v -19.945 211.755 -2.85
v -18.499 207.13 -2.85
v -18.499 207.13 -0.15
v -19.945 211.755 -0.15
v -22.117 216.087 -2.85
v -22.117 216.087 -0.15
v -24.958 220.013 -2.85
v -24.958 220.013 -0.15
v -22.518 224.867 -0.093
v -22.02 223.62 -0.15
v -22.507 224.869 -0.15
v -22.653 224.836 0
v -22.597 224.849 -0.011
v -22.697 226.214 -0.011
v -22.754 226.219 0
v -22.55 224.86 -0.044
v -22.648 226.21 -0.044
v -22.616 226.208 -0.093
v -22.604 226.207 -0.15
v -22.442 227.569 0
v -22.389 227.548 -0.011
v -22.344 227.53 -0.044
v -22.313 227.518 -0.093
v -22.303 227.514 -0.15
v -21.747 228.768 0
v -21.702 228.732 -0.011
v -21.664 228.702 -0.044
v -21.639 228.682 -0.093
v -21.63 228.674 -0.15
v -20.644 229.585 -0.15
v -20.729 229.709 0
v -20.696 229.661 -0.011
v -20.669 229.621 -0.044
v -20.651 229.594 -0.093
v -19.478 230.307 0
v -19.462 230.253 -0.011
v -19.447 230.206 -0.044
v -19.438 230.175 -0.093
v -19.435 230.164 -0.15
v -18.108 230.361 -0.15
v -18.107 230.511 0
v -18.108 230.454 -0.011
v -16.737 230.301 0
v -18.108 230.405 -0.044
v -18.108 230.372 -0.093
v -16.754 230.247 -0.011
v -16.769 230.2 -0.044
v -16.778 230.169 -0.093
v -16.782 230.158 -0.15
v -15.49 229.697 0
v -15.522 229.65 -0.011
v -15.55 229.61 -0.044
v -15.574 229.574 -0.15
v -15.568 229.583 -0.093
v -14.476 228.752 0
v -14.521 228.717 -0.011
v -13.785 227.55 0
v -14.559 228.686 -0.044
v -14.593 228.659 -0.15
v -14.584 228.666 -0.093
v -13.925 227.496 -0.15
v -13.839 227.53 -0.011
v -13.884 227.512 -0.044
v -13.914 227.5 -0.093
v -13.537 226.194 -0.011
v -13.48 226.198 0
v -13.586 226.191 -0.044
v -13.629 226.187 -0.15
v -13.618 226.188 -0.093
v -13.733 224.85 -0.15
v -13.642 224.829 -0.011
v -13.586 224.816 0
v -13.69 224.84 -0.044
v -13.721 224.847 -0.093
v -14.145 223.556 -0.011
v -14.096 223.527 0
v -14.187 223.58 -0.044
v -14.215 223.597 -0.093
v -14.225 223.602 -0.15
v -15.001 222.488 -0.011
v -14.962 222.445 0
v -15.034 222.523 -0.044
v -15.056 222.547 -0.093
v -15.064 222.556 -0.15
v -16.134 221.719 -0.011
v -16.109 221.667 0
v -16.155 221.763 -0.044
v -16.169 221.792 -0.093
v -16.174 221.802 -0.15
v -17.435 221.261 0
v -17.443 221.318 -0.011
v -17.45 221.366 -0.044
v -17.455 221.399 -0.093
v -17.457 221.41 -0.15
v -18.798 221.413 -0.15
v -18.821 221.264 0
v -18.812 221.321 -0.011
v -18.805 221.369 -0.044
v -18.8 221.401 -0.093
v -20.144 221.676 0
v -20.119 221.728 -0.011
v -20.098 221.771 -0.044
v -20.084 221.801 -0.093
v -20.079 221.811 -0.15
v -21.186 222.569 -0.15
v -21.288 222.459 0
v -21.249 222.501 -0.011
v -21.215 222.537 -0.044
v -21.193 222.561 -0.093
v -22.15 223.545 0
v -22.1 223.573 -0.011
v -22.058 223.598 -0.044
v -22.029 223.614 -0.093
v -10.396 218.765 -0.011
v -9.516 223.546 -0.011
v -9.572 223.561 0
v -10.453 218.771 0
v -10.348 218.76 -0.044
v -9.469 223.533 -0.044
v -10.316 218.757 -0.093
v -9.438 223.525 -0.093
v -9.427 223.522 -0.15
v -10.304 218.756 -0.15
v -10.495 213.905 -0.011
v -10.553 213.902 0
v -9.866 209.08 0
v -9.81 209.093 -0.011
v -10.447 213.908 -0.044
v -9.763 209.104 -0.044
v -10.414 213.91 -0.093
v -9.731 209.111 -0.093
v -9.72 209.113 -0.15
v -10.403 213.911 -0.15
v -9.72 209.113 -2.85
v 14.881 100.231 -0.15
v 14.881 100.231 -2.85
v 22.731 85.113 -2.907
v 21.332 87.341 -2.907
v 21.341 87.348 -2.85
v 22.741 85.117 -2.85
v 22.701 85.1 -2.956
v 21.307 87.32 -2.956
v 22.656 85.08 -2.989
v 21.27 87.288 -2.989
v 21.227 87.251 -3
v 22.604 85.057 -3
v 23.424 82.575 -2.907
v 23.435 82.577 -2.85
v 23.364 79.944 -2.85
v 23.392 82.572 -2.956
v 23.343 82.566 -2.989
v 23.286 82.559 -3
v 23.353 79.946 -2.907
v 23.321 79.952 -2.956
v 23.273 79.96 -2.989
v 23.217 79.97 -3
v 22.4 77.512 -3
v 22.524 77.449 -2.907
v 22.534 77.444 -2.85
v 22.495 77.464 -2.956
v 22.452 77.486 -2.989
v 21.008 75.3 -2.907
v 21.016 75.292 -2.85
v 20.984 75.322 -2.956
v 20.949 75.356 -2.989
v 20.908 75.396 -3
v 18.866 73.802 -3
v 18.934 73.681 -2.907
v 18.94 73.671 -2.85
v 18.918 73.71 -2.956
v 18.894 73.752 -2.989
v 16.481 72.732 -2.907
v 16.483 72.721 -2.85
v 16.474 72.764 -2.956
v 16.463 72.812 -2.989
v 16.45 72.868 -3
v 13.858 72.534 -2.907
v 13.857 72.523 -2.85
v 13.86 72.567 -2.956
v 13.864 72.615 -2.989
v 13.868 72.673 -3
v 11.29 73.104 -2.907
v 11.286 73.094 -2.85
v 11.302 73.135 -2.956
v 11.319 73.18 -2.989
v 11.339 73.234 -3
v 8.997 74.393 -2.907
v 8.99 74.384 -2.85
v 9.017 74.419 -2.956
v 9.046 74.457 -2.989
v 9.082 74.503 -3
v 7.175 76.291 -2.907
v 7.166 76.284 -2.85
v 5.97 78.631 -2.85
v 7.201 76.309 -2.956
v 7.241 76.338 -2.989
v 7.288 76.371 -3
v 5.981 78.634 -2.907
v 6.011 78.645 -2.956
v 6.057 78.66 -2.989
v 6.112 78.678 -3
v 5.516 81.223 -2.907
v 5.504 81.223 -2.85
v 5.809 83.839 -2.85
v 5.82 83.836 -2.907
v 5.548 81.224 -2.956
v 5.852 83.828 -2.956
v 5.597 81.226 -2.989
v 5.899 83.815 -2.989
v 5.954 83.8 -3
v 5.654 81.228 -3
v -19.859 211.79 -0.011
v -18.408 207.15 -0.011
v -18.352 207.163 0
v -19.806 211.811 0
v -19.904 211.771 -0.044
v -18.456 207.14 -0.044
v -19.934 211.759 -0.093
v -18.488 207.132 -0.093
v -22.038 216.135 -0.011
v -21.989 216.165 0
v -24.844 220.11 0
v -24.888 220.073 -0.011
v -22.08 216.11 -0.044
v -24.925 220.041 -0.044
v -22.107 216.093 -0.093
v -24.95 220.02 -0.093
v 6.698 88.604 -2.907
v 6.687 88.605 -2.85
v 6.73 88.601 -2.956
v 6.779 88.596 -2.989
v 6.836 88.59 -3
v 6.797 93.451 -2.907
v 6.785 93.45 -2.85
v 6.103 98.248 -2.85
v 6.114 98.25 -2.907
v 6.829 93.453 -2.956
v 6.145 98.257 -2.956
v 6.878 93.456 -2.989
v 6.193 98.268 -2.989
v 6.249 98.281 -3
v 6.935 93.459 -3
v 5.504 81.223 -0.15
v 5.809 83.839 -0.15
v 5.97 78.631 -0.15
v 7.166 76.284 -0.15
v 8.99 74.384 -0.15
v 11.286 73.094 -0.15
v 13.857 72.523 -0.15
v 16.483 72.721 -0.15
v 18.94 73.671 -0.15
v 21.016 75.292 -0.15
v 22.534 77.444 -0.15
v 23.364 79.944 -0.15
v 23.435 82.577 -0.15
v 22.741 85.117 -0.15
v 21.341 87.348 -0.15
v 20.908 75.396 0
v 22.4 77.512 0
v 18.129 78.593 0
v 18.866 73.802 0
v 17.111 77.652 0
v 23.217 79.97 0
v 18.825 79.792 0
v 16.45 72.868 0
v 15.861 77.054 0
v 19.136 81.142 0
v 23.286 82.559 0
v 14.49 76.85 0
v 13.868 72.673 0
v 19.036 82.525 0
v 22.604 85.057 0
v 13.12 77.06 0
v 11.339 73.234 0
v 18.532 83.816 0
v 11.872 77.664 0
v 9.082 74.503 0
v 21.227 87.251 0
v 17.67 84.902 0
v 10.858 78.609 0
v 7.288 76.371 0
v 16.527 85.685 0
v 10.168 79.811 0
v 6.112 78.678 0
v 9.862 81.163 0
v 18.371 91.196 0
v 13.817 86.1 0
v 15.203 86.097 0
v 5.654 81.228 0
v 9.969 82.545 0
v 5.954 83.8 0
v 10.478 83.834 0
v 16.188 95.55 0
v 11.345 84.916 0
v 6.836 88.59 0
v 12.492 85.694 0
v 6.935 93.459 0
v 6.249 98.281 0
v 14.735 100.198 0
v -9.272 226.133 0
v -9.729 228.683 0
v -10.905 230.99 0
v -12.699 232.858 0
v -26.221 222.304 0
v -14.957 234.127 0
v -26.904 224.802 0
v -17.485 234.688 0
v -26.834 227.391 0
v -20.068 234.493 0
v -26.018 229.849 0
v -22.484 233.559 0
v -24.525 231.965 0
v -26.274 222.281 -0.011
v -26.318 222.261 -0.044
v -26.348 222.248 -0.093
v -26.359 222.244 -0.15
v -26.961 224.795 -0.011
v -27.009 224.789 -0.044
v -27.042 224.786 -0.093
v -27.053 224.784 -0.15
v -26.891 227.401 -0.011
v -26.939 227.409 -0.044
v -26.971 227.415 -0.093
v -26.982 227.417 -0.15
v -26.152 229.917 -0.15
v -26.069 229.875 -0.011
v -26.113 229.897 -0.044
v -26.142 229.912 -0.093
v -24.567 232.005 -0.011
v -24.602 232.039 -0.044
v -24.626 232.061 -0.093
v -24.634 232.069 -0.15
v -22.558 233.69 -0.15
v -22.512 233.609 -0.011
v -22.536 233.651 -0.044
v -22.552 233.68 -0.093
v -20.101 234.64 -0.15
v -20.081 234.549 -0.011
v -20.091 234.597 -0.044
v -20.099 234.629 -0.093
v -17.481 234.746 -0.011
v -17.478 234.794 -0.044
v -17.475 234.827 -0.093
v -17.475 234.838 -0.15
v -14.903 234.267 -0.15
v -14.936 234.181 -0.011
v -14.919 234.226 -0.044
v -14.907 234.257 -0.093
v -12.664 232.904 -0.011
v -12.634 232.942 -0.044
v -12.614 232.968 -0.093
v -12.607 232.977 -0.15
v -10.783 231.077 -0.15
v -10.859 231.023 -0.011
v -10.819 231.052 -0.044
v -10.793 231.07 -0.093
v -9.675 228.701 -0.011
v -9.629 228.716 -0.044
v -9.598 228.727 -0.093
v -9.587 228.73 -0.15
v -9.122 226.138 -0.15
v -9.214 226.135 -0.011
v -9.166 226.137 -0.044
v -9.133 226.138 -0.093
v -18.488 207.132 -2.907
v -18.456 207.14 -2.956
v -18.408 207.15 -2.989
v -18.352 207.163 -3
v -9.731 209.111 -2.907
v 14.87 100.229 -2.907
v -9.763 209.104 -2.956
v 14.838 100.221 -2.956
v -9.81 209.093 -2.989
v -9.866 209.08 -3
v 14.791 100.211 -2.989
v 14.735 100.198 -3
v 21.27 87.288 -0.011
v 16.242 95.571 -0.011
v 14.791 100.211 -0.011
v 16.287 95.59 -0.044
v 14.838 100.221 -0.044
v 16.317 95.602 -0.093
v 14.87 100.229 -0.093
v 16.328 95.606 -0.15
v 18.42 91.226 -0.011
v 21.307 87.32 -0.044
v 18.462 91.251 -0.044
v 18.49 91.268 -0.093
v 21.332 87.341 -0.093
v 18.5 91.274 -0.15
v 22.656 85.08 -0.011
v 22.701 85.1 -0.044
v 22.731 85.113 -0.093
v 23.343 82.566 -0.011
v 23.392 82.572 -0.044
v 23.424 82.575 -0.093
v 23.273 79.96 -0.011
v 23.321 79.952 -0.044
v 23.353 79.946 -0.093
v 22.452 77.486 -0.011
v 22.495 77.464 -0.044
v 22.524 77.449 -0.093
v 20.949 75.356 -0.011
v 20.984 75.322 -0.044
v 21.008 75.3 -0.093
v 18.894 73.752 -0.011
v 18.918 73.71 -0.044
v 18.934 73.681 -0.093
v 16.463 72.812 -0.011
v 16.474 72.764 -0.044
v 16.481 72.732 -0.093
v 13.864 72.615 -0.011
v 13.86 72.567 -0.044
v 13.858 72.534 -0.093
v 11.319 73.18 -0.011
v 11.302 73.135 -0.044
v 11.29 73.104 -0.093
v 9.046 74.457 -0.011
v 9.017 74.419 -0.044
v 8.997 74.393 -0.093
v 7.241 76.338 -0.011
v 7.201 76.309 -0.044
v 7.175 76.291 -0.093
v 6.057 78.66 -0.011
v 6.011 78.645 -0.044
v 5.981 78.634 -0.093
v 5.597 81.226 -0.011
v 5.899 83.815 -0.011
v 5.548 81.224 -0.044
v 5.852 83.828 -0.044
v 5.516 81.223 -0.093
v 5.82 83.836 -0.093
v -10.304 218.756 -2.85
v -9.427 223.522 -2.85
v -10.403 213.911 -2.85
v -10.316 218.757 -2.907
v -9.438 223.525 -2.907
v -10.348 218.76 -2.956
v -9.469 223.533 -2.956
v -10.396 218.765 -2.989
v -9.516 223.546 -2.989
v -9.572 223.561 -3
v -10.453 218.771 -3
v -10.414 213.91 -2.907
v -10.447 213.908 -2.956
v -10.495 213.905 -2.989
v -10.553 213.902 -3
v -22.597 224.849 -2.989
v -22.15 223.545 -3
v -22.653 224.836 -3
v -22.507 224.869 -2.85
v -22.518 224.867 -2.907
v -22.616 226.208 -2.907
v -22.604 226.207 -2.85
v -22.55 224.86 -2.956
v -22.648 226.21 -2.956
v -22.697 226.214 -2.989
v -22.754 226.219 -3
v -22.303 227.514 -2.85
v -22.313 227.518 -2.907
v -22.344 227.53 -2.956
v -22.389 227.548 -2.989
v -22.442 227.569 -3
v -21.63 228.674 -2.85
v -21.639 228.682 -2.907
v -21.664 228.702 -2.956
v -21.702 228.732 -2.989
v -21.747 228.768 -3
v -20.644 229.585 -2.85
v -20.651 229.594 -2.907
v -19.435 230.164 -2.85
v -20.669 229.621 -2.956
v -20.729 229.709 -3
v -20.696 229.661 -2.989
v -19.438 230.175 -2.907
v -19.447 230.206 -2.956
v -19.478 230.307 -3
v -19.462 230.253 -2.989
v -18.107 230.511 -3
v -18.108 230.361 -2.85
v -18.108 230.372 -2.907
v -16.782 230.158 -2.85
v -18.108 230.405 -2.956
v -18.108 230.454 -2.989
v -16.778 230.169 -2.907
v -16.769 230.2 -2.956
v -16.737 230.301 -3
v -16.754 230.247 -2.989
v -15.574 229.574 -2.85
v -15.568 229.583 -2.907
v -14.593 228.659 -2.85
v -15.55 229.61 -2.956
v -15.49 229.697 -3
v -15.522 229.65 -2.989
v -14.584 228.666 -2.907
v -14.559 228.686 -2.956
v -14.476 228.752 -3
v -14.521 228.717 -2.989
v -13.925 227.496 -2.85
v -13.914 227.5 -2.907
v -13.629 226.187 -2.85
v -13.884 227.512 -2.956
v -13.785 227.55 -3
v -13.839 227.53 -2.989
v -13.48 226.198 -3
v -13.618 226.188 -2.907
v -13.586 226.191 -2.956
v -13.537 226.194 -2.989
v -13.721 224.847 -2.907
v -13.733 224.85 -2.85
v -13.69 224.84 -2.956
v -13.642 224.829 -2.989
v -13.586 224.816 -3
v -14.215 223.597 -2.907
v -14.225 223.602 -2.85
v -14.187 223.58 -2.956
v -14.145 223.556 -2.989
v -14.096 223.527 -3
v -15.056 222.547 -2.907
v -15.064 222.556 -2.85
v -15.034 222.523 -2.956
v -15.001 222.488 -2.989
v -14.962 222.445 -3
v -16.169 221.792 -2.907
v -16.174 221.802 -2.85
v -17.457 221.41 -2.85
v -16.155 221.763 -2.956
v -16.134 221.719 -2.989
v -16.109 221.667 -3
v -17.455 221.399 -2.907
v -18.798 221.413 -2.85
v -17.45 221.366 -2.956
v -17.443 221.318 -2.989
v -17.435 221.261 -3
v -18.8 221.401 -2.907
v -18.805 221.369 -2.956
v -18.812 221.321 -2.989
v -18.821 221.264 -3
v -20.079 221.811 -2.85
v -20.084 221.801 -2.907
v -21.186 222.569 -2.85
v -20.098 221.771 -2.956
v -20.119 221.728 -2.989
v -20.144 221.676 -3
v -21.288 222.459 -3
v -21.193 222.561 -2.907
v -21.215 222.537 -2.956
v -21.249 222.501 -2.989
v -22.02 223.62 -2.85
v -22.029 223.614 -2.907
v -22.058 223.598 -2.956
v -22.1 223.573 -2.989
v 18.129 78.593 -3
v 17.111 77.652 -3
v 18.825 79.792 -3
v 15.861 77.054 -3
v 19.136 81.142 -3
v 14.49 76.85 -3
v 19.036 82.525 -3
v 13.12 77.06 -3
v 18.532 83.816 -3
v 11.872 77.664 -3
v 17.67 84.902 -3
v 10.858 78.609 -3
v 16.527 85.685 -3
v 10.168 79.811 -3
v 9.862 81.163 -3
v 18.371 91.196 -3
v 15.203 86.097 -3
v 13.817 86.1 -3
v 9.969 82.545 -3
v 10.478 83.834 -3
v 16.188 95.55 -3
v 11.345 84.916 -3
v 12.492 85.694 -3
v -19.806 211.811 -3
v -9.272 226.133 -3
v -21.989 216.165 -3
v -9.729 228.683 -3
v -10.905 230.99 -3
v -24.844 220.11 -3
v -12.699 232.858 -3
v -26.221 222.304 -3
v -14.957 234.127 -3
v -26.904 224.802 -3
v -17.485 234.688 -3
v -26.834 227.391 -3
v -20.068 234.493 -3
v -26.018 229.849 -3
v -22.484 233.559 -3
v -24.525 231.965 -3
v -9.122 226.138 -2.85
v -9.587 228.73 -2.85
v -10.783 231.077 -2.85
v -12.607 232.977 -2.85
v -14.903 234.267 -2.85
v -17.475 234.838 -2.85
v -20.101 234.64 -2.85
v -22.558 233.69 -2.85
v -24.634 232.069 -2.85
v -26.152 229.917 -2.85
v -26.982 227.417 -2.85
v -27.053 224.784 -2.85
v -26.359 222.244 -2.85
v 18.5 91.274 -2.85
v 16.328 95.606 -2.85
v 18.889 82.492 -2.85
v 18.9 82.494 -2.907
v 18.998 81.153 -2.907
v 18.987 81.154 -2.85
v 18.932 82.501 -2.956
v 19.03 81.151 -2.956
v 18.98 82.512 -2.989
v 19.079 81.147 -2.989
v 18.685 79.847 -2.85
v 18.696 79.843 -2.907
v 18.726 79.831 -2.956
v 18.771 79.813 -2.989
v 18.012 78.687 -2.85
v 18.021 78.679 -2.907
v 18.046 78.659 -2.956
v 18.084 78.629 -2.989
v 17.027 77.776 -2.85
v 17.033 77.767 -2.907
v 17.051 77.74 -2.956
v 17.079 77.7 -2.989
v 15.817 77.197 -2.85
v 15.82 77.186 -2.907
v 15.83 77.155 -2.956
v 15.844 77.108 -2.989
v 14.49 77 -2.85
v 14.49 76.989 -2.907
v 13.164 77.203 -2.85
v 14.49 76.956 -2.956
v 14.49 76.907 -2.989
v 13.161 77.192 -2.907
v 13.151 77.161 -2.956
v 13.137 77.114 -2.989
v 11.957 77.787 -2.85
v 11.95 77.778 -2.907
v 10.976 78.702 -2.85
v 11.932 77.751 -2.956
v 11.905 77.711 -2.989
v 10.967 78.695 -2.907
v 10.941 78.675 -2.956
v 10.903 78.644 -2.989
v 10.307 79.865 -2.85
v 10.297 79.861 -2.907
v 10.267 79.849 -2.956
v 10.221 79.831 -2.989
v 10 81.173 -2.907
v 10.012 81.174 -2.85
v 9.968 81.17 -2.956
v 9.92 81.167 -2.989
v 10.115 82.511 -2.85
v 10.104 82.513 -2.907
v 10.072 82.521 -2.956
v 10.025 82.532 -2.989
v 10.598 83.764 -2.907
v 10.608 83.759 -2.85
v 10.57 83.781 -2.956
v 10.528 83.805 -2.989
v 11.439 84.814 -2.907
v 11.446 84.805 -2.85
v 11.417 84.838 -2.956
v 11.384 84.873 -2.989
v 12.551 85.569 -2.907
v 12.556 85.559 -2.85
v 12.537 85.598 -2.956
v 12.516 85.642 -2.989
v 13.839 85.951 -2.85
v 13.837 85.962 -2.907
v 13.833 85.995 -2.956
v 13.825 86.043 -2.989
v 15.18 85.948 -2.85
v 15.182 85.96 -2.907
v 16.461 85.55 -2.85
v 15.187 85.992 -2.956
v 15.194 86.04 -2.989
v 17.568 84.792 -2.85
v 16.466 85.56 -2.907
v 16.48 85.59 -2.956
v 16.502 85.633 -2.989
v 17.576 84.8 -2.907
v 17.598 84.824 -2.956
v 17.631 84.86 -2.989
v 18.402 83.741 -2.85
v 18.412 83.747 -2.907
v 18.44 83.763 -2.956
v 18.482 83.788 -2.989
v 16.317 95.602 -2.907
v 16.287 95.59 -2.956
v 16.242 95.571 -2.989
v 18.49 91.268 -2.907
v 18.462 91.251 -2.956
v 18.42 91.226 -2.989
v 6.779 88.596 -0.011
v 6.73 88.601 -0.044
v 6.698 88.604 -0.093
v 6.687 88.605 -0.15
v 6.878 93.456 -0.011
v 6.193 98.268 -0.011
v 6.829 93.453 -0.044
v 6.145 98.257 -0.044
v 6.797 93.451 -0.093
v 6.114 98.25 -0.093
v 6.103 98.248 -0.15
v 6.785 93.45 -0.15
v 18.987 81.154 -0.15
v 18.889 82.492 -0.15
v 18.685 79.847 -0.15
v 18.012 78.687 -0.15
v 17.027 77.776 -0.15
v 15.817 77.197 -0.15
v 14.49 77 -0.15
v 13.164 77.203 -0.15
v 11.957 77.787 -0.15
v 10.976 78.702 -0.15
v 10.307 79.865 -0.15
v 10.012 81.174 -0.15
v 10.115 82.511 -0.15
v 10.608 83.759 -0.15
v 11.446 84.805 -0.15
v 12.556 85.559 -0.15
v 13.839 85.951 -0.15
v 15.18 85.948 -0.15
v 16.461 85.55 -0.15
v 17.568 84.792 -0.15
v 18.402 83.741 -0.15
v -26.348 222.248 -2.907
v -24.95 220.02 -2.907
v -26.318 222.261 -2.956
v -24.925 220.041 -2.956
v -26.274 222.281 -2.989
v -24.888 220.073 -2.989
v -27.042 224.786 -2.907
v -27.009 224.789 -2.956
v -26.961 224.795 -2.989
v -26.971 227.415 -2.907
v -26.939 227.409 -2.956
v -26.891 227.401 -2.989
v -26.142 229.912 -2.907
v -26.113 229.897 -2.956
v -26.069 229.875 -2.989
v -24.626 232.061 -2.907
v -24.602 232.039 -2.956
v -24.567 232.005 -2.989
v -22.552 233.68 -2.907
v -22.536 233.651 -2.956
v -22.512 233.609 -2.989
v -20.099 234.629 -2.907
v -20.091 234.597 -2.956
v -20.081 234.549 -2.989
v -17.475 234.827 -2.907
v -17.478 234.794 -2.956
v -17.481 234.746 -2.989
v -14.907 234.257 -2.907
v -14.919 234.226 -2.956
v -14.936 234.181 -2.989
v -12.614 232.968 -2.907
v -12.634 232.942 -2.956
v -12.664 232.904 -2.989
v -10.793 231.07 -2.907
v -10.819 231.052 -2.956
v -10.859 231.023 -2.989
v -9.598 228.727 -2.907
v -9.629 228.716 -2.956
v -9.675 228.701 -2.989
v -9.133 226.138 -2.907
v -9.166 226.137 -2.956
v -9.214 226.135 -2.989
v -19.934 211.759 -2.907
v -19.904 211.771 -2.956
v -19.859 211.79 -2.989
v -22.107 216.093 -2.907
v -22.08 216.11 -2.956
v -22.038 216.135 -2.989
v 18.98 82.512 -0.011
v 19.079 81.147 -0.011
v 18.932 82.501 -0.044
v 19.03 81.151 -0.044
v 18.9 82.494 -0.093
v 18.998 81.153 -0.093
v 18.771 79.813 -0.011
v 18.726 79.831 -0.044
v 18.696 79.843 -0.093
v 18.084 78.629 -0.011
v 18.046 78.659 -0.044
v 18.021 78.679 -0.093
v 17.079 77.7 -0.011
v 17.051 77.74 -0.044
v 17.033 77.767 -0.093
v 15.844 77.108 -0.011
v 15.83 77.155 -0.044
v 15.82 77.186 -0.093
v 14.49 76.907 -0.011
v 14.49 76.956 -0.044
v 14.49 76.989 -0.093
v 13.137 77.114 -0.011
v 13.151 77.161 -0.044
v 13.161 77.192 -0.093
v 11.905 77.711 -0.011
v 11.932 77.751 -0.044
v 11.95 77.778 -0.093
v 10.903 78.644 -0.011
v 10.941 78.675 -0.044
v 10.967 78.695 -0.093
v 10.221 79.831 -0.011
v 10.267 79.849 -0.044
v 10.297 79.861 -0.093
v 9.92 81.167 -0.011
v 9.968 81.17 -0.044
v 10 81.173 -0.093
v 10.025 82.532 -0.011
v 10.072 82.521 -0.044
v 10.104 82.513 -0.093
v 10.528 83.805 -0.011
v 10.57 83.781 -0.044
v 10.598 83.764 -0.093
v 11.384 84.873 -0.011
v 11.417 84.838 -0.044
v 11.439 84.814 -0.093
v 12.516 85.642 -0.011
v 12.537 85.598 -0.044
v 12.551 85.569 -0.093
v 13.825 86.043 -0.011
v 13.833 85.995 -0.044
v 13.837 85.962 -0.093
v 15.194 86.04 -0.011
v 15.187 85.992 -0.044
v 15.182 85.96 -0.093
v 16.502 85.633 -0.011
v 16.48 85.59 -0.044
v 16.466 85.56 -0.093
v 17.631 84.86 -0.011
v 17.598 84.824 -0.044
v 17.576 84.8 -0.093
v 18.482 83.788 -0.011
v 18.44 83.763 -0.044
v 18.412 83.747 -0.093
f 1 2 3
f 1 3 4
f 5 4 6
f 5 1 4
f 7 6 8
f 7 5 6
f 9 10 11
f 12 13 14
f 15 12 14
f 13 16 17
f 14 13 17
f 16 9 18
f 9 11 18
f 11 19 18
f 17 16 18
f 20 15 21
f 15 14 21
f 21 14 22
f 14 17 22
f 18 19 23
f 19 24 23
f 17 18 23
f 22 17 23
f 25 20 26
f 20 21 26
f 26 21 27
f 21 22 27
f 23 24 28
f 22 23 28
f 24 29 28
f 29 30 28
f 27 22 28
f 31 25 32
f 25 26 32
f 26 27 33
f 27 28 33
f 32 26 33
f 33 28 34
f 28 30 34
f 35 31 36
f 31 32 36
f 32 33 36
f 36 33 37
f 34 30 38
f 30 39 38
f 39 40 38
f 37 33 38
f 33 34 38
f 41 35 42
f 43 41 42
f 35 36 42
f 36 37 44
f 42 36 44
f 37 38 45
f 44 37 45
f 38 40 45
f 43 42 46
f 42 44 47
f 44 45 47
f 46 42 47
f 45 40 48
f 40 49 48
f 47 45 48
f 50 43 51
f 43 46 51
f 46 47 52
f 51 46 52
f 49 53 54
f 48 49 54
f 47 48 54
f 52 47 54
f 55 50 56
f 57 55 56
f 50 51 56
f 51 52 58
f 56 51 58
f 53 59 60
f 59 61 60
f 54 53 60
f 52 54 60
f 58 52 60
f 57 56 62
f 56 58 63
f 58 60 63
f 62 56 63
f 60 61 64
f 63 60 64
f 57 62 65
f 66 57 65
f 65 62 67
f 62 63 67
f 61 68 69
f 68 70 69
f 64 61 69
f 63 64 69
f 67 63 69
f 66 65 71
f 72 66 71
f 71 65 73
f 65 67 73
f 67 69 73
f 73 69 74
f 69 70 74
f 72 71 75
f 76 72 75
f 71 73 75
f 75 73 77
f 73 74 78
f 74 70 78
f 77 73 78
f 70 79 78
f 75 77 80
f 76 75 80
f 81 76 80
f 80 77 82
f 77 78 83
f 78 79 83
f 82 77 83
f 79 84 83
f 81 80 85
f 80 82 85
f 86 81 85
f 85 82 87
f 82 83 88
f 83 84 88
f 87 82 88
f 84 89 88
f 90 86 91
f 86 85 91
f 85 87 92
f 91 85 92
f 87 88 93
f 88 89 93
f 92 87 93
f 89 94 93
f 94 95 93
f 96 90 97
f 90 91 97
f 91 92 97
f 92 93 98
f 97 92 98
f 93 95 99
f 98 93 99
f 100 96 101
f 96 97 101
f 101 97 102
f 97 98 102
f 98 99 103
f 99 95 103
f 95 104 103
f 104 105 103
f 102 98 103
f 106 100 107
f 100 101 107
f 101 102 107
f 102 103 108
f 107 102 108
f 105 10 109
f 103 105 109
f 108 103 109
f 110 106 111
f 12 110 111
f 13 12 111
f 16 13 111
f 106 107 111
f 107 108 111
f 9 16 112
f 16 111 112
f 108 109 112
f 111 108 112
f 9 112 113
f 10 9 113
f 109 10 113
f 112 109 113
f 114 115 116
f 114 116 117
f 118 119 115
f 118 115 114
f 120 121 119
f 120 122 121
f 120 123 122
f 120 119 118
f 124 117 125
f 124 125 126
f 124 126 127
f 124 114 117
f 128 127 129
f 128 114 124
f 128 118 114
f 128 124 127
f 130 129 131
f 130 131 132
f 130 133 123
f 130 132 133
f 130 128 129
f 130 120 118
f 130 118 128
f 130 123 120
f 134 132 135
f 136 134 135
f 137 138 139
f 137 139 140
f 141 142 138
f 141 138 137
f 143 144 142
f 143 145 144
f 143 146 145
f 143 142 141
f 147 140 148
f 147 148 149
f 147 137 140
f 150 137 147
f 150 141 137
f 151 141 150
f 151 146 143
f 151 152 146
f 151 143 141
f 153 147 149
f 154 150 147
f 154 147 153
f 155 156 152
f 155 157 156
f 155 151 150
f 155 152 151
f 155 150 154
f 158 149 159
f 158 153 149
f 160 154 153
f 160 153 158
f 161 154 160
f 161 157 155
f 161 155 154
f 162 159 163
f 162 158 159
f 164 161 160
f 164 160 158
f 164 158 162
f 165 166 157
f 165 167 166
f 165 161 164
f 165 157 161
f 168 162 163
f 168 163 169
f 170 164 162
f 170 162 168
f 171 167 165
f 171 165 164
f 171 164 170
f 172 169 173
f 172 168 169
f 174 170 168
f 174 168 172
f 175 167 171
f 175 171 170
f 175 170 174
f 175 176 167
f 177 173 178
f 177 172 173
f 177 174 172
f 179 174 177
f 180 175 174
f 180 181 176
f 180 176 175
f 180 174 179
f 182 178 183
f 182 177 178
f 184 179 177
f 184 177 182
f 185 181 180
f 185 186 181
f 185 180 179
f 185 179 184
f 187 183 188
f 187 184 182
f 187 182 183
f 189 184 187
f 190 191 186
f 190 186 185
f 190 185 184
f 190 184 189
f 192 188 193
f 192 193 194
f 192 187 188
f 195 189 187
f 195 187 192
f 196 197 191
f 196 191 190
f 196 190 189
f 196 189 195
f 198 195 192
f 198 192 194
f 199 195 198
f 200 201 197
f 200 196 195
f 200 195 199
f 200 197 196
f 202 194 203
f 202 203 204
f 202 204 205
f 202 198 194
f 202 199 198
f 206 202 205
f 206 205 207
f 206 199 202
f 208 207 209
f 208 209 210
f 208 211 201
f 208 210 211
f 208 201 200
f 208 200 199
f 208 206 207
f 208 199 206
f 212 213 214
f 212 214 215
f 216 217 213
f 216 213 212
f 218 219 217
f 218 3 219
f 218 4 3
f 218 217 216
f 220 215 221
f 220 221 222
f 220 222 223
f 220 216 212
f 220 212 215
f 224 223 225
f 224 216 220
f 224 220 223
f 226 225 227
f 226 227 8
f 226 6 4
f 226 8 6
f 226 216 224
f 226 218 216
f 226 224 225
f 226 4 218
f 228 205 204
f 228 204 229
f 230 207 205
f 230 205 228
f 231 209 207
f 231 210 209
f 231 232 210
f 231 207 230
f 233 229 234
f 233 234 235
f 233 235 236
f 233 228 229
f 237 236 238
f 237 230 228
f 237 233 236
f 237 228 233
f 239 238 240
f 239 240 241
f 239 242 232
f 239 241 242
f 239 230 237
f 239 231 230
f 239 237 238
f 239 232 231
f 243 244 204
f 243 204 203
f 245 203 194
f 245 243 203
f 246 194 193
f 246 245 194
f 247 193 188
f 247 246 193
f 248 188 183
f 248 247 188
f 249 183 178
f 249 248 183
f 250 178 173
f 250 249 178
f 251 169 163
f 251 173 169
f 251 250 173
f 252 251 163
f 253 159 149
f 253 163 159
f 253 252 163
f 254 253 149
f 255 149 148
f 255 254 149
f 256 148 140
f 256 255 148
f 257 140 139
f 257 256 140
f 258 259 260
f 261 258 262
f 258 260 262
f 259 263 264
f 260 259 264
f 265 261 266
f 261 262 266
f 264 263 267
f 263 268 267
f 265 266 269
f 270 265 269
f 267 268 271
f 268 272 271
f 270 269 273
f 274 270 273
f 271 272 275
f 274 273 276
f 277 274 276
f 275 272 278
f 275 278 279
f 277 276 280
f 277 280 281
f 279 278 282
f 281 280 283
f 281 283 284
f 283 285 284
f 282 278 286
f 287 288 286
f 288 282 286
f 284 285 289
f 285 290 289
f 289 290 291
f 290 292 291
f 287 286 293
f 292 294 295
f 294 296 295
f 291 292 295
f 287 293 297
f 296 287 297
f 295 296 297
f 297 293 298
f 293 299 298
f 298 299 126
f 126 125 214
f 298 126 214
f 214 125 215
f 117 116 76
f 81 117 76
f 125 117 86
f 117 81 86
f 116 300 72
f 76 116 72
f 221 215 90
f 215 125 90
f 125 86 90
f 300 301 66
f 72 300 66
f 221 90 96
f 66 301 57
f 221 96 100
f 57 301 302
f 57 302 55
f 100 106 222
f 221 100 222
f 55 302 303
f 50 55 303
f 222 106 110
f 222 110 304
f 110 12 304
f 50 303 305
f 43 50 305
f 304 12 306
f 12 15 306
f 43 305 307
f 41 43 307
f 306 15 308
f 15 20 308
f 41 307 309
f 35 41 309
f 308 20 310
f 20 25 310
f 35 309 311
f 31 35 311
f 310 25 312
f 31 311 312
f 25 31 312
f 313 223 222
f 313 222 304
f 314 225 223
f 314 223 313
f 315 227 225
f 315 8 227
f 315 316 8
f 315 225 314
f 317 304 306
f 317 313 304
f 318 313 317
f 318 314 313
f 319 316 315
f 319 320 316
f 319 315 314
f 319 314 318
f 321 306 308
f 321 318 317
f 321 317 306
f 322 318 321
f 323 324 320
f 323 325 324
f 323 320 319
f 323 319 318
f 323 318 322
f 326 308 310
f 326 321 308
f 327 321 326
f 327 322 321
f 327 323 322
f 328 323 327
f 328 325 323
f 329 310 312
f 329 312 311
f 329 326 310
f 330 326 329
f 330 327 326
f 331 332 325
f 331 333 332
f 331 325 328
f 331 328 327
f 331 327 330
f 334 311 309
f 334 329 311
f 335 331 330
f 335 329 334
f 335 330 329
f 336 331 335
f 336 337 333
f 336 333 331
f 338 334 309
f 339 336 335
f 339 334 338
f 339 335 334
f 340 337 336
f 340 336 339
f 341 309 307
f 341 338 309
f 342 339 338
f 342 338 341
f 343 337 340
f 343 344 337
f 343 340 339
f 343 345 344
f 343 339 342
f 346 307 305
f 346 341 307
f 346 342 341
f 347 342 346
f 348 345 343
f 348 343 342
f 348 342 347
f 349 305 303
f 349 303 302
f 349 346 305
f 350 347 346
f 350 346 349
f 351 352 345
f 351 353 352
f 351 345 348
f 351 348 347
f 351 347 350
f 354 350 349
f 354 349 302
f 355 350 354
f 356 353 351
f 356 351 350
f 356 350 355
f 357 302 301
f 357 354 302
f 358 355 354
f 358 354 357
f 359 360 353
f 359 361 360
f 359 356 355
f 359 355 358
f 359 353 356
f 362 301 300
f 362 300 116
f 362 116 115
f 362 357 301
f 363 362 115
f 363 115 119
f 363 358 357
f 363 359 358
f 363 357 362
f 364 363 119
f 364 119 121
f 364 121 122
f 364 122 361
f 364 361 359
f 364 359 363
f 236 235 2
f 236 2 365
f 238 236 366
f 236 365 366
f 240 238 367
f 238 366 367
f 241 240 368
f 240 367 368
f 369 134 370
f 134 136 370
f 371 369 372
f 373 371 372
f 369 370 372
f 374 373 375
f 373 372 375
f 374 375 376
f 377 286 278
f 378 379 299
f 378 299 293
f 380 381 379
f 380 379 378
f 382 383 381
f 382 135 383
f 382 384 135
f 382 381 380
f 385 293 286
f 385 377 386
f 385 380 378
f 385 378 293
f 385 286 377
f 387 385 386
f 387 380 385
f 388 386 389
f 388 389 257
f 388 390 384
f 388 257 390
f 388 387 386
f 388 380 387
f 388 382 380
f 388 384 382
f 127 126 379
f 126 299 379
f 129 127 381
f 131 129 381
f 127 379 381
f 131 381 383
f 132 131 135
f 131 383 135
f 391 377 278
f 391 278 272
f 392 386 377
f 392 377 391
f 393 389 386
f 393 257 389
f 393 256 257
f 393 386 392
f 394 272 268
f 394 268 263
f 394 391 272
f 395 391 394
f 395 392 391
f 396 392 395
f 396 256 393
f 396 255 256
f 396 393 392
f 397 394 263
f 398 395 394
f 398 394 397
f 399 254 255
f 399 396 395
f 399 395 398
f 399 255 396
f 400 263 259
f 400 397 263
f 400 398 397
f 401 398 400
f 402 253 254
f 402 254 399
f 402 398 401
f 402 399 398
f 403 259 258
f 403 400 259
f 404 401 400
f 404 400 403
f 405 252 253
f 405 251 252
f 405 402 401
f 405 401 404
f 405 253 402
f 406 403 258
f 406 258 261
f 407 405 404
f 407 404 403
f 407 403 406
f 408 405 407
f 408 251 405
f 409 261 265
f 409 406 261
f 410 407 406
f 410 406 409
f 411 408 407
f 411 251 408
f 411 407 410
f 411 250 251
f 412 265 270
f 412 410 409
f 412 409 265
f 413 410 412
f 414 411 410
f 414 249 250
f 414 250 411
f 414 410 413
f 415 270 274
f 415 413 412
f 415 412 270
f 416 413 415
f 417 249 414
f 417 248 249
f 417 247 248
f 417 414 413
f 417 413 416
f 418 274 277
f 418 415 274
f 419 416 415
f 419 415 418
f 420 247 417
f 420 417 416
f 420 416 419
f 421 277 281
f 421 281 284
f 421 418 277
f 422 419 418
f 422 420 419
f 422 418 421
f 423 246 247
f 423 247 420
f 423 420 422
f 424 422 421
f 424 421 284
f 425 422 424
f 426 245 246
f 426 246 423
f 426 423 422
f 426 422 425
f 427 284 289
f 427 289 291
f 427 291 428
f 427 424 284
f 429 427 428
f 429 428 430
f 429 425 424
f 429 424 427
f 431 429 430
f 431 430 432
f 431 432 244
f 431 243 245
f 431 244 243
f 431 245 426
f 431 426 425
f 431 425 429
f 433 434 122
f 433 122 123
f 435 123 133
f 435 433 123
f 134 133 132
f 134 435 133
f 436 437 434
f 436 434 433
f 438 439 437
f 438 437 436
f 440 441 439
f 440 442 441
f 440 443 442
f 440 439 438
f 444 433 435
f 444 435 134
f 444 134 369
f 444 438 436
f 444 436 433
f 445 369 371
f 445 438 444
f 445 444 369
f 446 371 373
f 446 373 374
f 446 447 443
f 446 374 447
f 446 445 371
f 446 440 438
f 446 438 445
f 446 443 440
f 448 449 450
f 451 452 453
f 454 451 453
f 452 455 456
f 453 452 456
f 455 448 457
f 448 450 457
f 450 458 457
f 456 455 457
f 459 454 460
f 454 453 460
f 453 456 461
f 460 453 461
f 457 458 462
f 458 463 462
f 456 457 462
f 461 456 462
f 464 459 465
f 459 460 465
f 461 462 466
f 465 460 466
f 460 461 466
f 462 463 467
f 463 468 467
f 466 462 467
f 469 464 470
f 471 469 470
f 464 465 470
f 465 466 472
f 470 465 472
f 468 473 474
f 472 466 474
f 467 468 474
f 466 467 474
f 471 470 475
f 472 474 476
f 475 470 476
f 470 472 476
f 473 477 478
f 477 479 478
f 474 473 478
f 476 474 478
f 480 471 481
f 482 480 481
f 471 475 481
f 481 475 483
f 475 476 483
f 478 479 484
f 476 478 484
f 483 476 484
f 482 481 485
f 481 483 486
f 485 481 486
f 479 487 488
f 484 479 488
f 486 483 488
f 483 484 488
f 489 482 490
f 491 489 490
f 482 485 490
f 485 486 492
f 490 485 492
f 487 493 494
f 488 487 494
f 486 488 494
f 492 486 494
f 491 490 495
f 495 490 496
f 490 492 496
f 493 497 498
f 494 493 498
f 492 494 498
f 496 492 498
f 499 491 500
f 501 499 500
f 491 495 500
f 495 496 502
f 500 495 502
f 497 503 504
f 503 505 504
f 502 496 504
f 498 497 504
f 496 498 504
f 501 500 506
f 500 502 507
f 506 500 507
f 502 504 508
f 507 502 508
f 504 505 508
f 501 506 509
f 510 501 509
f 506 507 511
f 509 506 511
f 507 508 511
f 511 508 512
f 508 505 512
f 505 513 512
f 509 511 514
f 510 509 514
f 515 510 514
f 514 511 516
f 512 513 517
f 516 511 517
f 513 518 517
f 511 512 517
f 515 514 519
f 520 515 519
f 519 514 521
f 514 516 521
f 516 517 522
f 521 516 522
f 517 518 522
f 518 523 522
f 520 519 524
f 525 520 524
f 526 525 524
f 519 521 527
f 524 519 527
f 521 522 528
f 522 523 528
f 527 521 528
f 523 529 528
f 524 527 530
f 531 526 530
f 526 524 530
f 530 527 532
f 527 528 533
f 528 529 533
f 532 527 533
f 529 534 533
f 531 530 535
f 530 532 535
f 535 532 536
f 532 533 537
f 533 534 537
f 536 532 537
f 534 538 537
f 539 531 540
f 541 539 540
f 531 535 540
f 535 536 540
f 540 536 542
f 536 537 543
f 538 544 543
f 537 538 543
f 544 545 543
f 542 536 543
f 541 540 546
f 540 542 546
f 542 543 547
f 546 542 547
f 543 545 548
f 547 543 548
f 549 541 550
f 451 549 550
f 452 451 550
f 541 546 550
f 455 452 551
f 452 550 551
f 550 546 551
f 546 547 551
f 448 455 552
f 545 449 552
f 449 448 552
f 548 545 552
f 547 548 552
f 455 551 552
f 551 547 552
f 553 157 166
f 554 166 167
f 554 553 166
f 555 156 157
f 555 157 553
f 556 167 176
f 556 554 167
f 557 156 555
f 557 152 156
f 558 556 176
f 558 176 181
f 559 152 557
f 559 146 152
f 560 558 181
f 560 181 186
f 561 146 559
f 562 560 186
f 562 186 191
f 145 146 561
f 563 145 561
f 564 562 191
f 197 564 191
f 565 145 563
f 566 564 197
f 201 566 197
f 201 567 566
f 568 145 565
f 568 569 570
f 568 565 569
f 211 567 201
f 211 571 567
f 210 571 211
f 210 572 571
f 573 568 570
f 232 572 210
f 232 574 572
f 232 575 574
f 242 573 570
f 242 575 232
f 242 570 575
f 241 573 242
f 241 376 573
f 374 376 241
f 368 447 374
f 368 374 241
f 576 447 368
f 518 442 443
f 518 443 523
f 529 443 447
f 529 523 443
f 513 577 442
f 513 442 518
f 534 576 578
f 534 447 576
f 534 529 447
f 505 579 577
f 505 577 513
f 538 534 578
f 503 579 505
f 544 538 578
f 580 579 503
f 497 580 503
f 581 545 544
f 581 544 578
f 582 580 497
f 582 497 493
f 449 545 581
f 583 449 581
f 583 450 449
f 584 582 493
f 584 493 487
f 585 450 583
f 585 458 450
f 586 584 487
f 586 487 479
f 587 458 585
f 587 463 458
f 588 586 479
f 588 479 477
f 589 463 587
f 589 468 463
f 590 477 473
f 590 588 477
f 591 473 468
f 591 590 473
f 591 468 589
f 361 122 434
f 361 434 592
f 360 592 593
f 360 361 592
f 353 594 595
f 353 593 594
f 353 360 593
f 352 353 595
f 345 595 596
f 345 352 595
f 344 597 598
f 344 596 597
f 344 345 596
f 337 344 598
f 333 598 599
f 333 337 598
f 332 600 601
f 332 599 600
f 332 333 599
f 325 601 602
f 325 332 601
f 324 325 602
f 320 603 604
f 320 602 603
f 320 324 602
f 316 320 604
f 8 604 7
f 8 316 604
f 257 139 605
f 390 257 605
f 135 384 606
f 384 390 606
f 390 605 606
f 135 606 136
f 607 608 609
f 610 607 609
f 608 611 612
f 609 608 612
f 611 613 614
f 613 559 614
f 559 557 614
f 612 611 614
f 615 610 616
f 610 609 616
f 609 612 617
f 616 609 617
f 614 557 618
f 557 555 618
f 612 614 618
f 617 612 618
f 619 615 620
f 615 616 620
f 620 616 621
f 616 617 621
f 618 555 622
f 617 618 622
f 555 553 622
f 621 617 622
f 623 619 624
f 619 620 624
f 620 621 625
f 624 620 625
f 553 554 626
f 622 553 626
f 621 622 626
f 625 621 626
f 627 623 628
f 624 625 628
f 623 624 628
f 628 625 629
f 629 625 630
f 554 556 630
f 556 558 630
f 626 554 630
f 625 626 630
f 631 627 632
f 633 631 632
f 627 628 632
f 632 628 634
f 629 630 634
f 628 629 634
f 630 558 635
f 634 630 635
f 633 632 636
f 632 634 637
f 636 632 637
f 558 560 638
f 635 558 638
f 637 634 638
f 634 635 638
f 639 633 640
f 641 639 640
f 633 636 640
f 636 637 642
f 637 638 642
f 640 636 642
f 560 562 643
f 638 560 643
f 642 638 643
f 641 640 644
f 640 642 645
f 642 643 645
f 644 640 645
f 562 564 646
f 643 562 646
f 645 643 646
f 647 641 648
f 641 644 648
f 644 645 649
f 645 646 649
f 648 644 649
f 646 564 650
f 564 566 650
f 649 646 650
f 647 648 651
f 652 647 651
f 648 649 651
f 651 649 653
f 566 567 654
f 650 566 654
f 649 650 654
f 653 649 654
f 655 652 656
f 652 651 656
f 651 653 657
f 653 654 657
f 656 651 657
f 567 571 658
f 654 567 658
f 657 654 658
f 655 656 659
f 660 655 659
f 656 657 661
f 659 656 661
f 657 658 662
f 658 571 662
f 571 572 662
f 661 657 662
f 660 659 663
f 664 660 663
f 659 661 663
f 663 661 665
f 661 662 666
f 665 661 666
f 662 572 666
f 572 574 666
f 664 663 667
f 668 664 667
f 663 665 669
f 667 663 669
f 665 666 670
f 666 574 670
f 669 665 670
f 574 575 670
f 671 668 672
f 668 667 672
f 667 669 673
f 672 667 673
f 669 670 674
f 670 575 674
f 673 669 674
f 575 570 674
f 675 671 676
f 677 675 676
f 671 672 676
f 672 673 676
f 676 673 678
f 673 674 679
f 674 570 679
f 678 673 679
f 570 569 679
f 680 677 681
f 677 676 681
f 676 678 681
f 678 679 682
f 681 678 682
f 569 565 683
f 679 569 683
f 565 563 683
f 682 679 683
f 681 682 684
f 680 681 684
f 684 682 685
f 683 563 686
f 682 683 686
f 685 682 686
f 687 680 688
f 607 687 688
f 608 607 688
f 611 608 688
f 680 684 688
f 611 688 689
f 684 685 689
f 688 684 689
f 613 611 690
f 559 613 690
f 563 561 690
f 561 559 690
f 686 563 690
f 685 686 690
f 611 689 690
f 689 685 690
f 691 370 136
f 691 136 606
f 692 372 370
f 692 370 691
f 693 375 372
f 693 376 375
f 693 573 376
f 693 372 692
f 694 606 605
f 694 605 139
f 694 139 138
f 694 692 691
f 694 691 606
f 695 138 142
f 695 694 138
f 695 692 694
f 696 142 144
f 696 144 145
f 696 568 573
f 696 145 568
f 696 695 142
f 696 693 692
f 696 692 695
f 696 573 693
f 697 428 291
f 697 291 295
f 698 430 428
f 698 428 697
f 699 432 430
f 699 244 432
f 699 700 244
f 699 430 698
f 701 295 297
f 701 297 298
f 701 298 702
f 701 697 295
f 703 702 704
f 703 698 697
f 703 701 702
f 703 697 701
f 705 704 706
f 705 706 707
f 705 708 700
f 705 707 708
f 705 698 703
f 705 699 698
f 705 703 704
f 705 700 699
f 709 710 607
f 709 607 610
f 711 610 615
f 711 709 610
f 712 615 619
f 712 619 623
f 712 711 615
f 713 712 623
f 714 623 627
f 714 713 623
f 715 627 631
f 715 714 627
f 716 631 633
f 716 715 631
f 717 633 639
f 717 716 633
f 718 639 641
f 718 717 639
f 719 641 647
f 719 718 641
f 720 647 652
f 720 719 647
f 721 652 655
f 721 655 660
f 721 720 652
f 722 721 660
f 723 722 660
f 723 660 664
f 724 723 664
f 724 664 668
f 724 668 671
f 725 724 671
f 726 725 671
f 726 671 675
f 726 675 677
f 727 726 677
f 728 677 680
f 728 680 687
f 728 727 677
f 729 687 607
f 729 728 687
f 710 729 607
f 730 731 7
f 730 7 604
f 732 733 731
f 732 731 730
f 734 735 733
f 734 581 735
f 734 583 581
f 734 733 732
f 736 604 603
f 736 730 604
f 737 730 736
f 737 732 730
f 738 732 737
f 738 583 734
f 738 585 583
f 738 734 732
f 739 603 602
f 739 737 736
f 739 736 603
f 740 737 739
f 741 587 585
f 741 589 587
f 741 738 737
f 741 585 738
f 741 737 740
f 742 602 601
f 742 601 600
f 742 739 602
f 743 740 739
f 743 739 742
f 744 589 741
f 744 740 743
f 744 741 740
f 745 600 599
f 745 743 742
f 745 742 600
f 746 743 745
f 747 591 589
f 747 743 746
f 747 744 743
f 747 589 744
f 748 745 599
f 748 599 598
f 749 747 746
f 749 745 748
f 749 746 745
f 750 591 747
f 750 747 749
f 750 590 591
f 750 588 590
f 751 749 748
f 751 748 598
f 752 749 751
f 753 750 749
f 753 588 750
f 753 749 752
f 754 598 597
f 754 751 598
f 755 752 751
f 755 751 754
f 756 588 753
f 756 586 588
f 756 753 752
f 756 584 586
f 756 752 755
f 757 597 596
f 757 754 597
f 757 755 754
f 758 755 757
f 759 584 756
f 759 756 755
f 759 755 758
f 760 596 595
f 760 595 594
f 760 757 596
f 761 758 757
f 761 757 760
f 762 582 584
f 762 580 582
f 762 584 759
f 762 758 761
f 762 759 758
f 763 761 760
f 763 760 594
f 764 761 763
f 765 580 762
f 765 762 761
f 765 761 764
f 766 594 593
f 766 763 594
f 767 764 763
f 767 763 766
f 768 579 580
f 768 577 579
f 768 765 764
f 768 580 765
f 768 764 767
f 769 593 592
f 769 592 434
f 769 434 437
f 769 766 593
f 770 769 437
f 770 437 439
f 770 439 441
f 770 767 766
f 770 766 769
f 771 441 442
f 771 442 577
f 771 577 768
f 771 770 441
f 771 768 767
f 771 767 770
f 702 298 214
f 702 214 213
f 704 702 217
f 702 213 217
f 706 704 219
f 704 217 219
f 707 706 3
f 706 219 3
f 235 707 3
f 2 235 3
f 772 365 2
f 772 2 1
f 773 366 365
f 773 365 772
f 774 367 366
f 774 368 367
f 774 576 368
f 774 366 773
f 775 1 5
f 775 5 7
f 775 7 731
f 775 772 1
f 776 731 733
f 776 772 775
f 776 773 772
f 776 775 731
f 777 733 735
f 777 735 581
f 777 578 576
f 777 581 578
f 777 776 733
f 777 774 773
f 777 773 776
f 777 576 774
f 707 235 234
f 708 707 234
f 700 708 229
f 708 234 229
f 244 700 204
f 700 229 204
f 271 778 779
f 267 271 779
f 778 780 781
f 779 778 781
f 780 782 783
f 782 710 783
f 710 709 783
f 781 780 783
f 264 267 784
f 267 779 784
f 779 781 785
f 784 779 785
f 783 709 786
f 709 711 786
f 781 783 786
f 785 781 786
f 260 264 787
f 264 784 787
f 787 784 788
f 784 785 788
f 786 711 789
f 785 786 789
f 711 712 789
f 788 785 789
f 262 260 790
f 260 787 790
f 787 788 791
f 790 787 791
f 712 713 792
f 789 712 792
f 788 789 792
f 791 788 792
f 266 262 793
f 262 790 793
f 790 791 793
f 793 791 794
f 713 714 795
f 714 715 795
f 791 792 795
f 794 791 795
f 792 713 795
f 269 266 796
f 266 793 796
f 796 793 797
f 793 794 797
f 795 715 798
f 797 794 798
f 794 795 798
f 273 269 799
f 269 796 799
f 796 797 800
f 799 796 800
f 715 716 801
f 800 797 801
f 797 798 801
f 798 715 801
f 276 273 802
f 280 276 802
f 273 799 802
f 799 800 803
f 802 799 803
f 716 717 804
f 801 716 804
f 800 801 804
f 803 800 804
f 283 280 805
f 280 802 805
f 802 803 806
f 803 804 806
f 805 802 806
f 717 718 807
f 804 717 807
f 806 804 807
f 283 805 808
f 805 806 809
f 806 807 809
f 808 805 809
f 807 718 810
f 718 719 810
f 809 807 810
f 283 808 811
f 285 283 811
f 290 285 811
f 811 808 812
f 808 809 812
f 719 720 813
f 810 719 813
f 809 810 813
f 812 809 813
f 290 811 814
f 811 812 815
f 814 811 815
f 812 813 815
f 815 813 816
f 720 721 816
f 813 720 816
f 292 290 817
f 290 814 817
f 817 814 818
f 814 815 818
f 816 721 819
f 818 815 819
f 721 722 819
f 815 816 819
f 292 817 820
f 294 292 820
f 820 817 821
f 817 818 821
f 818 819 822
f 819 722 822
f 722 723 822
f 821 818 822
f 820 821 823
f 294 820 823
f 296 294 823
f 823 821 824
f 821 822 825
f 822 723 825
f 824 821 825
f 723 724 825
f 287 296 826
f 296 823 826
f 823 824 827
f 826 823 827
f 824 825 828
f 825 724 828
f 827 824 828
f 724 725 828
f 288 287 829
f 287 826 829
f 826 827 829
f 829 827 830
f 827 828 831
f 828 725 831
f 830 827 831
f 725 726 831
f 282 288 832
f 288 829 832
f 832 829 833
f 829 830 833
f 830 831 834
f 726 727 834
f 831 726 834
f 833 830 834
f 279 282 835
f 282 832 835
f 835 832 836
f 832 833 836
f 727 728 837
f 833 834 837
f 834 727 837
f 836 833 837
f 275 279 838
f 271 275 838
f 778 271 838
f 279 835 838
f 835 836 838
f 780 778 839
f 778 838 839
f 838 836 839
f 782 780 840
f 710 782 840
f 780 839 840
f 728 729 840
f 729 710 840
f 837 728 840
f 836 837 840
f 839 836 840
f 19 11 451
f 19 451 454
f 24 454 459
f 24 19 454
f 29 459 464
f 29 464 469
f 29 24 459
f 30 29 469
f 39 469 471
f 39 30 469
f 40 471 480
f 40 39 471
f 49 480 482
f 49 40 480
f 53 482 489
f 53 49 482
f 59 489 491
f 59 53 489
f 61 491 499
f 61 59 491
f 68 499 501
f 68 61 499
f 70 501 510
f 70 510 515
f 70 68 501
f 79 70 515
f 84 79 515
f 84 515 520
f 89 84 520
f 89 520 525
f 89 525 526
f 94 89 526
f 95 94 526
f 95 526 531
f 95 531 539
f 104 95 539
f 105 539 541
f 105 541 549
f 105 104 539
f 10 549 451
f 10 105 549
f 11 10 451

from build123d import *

# Parameters (mm, degrees)
DODANIE_WYCI_GNI_CIE1_DEPTH = 3
ZAOKR_GLENIE1_R             = 30
ZAOKR_GLENIE2_R             = 30
ZAOKR_GLENIE3_R             = 30
ZAOKR_GLENIE4_R             = 30
ZAOKR_GLENIE5_R             = 0.15


with BuildPart() as part:
    # Szkic2 → Dodanie-wyciągnięcie1 (new body)
    with BuildSketch(Plane.XY):
        with BuildLine():
            ThreePointArc((18.889354473, 82.491749621), (13.508250379, 85.889354473), (10.110645527, 80.508250379))
            Line((10.110645527, 80.508250379), (-22.506897562, 224.869241934))
            ThreePointArc((-22.506897562, 224.869241934), (-17.125793468, 221.471637082), (-13.728188616, 226.852741176))
            Line((-13.728188616, 226.852741176), (18.889354473, 82.491749621))
        make_face()
        with BuildLine():
            ThreePointArc((18.889354473, 82.491749621), (15.491749621, 77.110645527), (10.110645527, 80.508250379))
            Line((10.110645527, 80.508250379), (8.392884795, 88.110835339))
            ThreePointArc((8.392884795, 88.110835339), (16.483499242, 72.721291054), (17.171593741, 90.094334581))
            Line((17.171593741, 90.094334581), (18.889354473, 82.491749621))
        make_face()
        with BuildLine():
            ThreePointArc((-12.010427884, 219.250156217), (-20.101042331, 234.639700501), (-20.78913683, 217.266656975))
            Line((-20.78913683, 217.266656975), (-22.506897562, 224.869241934))
            ThreePointArc((-22.506897562, 224.869241934), (-19.10929271, 230.250346028), (-13.728188616, 226.852741176))
            Line((-13.728188616, 226.852741176), (-12.010427884, 219.250156217))
        make_face()
    extrude(amount=-DODANIE_WYCI_GNI_CIE1_DEPTH)

    # Zaokrąglenie1
    zaokr_glenie1_edges = [part.edges().sort_by_distance(p)[0] for p in [
        (-20.78913683, 217.266656975, -1.5),
    ]]
    fillet(zaokr_glenie1_edges, radius=ZAOKR_GLENIE1_R)

    # Zaokrąglenie2
    zaokr_glenie2_edges = [part.edges().sort_by_distance(p)[0] for p in [
        (-12.010427884, 219.250156217, -1.5),
    ]]
    fillet(zaokr_glenie2_edges, radius=ZAOKR_GLENIE2_R)

    # Zaokrąglenie3
    zaokr_glenie3_edges = [part.edges().sort_by_distance(p)[0] for p in [
        (8.392884795, 88.110835339, -1.5),
    ]]
    fillet(zaokr_glenie3_edges, radius=ZAOKR_GLENIE3_R)

    # Zaokrąglenie4
    zaokr_glenie4_edges = [part.edges().sort_by_distance(p)[0] for p in [
        (17.171593741, 90.094334581, -1.5),
    ]]
    fillet(zaokr_glenie4_edges, radius=ZAOKR_GLENIE4_R)

    # Zaokrąglenie5
    zaokr_glenie5_edges = [part.edges().sort_by_distance(p)[0] for p in [
        (-17.125793468, 221.471637082, -3),
        (-20.943505179, 213.964915113, 0),
        (-20.943505179, 213.964915113, -3),
        (15.491749621, 77.110645527, -3),
        (-20.101042331, 234.639700501, -3),
        (-20.101042331, 234.639700501, 0),
        (-10.451504967, 216.335522749, 0),
        (-10.451504967, 216.335522749, -3),
        (-6.198126017, 152.688746157, 0),
        (-6.198126017, 152.688746157, -3),
        (6.833961878, 91.025468806, 0),
        (6.833961878, 91.025468806, -3),
        (16.483499242, 72.721291054, 0),
        (16.483499242, 72.721291054, -3),
        (2.580582929, 154.672245399, -3),
        (2.580582929, 154.672245399, 0),
        (17.32596209, 93.396076442, 0),
        (17.32596209, 93.396076442, -3),
        (15.491749621, 77.110645527, 0),
        (-17.125793468, 221.471637082, 0),
    ]]
    fillet(zaokr_glenie5_edges, radius=ZAOKR_GLENIE5_R)


solid = part.part
